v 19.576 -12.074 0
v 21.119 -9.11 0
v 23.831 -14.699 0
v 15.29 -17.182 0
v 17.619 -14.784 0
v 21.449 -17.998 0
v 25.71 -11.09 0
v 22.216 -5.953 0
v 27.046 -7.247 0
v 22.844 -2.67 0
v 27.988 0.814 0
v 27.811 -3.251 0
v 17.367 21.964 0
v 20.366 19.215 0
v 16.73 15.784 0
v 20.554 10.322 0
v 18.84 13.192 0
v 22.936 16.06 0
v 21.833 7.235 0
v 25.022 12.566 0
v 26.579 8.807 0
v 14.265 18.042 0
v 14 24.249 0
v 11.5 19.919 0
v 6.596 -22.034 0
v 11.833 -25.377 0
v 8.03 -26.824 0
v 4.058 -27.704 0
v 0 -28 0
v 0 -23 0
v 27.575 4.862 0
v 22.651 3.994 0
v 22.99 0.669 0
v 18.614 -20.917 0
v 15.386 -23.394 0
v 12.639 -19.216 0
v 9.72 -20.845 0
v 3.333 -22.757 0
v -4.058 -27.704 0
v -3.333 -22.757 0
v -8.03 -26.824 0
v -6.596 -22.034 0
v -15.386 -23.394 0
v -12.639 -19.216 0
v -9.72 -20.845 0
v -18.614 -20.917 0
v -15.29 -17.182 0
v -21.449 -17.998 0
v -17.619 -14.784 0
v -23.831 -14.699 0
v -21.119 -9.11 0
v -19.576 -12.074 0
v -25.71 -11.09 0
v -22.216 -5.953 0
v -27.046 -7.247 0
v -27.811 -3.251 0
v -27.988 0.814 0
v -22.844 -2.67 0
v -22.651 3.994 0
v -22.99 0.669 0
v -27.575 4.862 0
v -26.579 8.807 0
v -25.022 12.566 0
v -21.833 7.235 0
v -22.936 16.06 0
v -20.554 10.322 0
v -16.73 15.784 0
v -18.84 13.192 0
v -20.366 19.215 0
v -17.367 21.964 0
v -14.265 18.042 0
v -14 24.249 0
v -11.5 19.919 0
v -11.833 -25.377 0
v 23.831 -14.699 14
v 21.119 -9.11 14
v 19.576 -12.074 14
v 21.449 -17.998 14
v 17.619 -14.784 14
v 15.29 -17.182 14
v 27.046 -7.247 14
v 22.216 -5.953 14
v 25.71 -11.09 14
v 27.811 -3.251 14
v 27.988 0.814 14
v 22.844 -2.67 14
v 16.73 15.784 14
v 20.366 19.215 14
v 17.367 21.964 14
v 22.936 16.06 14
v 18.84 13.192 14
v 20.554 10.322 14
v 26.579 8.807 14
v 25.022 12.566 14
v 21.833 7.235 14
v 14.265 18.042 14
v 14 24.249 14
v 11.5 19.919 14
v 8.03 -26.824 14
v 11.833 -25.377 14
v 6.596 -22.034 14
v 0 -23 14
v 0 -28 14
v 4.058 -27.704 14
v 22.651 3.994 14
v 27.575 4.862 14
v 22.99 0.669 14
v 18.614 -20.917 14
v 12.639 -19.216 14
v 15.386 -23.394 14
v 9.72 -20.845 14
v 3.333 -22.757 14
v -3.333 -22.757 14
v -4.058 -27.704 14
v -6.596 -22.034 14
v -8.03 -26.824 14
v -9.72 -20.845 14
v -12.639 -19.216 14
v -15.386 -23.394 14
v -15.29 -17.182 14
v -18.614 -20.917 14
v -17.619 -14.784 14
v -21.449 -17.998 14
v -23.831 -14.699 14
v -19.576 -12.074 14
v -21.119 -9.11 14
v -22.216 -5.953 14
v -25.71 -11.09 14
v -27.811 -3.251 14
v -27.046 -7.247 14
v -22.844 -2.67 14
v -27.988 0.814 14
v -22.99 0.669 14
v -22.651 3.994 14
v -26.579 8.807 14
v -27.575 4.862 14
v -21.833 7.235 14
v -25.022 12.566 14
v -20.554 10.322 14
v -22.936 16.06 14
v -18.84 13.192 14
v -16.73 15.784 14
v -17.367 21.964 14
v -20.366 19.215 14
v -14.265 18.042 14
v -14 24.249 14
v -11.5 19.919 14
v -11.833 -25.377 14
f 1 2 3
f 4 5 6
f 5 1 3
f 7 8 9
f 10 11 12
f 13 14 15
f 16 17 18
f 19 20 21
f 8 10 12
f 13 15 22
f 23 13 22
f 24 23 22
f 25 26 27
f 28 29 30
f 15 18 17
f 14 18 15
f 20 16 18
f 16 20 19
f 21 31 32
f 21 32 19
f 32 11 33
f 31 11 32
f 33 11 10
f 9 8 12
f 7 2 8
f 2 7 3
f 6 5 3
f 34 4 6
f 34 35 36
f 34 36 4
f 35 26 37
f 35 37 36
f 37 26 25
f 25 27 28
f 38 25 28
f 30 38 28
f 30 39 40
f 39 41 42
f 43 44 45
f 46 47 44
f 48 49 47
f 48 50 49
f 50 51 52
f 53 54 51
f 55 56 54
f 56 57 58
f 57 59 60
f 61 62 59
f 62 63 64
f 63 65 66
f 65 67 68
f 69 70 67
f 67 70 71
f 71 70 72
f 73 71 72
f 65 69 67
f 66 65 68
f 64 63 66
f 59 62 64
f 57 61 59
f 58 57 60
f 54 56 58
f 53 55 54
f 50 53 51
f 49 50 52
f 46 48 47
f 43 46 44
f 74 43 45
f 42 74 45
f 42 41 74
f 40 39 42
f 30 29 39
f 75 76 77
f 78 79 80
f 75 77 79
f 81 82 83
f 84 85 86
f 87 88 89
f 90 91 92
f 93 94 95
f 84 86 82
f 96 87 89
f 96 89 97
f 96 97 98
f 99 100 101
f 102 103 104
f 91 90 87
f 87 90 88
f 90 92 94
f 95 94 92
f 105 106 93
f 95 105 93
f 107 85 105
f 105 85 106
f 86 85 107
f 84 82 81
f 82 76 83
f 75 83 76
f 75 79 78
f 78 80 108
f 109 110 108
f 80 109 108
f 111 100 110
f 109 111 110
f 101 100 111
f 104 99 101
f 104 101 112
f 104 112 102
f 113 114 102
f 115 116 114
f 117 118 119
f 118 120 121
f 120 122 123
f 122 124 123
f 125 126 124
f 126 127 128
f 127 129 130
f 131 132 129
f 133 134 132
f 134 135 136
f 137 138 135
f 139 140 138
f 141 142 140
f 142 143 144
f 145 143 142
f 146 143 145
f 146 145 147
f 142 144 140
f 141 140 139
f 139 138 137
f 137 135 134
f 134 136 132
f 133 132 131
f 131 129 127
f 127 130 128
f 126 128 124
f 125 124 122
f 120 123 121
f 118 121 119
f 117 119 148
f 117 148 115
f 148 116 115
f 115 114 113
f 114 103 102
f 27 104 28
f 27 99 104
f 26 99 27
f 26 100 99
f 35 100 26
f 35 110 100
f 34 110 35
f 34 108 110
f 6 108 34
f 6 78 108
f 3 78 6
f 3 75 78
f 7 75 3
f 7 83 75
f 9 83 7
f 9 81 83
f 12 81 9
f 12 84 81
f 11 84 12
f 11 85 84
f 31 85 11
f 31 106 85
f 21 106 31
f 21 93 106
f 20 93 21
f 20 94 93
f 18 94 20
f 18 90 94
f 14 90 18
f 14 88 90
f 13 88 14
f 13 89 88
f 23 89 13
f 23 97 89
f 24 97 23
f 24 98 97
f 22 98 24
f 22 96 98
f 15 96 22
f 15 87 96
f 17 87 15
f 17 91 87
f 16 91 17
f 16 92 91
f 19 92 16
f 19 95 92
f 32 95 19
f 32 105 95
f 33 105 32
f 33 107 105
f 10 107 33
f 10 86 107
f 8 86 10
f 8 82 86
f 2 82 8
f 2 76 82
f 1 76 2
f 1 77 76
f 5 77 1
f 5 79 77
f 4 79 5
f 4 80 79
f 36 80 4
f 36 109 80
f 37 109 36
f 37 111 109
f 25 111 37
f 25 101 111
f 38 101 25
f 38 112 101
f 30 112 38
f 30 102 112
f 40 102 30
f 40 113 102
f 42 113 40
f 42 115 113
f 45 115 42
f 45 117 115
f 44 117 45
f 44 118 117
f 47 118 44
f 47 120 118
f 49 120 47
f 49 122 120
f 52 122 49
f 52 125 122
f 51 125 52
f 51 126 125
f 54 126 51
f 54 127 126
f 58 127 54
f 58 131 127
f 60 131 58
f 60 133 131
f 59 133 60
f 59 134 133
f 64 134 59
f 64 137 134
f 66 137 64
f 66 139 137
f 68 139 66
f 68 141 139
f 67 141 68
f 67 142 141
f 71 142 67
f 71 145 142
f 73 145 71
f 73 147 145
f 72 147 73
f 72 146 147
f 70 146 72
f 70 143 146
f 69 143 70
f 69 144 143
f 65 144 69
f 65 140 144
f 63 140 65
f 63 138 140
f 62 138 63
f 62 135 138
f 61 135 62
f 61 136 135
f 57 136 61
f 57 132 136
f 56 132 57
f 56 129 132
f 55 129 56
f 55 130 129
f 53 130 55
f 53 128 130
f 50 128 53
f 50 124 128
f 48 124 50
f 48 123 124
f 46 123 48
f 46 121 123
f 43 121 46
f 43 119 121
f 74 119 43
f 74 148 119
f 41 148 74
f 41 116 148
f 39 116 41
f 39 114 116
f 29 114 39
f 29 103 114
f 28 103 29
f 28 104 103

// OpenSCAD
$fn = 32;

// ----------------------------------------------------------------------
// Spring clip: 56 mm outside, 5 mm band, 60 degree opening
// ----------------------------------------------------------------------

// --- parameters (mm) ---
outer_r = 28;             // clip outside radius
inner_r = 23;             // clip bore radius
band = 5;                 // band thickness
clip_w = 14;              // clip width
opening = 60;             // opening angle

clip_profile = [[-14, 24.249], [-17.367, 21.964], [-20.366, 19.215], [-22.936, 16.06], [-25.022, 12.566], [-26.579, 8.807], [-27.575, 4.862], [-27.988, 0.814], [-27.811, -3.251], [-27.046, -7.247], [-25.71, -11.09], [-23.831, -14.699], [-21.449, -17.998], [-18.614, -20.917], [-15.386, -23.394], [-11.833, -25.377], [-8.03, -26.824], [-4.058, -27.704], [0, -28], [4.058, -27.704], [8.03, -26.824], [11.833, -25.377], [15.386, -23.394], [18.614, -20.917], [21.449, -17.998], [23.831, -14.699], [25.71, -11.09], [27.046, -7.247], [27.811, -3.251], [27.988, 0.814], [27.575, 4.862], [26.579, 8.807], [25.022, 12.566], [22.936, 16.06], [20.366, 19.215], [17.367, 21.964], [14, 24.249], [11.5, 19.919], [14.265, 18.042], [16.73, 15.784], [18.84, 13.192], [20.554, 10.322], [21.833, 7.235], [22.651, 3.994], [22.99, 0.669], [22.844, -2.67], [22.216, -5.953], [21.119, -9.11], [19.576, -12.074], [17.619, -14.784], [15.29, -17.182], [12.639, -19.216], [9.72, -20.845], [6.596, -22.034], [3.333, -22.757], [0, -23], [-3.333, -22.757], [-6.596, -22.034], [-9.72, -20.845], [-12.639, -19.216], [-15.29, -17.182], [-17.619, -14.784], [-19.576, -12.074], [-21.119, -9.11], [-22.216, -5.953], [-22.844, -2.67], [-22.99, 0.669], [-22.651, 3.994], [-21.833, 7.235], [-20.554, 10.322], [-18.84, 13.192], [-16.73, 15.784], [-14.265, 18.042], [-11.5, 19.919]];

difference() {
  union() {
    linear_extrude(height = clip_w) polygon(clip_profile);
  }
}
